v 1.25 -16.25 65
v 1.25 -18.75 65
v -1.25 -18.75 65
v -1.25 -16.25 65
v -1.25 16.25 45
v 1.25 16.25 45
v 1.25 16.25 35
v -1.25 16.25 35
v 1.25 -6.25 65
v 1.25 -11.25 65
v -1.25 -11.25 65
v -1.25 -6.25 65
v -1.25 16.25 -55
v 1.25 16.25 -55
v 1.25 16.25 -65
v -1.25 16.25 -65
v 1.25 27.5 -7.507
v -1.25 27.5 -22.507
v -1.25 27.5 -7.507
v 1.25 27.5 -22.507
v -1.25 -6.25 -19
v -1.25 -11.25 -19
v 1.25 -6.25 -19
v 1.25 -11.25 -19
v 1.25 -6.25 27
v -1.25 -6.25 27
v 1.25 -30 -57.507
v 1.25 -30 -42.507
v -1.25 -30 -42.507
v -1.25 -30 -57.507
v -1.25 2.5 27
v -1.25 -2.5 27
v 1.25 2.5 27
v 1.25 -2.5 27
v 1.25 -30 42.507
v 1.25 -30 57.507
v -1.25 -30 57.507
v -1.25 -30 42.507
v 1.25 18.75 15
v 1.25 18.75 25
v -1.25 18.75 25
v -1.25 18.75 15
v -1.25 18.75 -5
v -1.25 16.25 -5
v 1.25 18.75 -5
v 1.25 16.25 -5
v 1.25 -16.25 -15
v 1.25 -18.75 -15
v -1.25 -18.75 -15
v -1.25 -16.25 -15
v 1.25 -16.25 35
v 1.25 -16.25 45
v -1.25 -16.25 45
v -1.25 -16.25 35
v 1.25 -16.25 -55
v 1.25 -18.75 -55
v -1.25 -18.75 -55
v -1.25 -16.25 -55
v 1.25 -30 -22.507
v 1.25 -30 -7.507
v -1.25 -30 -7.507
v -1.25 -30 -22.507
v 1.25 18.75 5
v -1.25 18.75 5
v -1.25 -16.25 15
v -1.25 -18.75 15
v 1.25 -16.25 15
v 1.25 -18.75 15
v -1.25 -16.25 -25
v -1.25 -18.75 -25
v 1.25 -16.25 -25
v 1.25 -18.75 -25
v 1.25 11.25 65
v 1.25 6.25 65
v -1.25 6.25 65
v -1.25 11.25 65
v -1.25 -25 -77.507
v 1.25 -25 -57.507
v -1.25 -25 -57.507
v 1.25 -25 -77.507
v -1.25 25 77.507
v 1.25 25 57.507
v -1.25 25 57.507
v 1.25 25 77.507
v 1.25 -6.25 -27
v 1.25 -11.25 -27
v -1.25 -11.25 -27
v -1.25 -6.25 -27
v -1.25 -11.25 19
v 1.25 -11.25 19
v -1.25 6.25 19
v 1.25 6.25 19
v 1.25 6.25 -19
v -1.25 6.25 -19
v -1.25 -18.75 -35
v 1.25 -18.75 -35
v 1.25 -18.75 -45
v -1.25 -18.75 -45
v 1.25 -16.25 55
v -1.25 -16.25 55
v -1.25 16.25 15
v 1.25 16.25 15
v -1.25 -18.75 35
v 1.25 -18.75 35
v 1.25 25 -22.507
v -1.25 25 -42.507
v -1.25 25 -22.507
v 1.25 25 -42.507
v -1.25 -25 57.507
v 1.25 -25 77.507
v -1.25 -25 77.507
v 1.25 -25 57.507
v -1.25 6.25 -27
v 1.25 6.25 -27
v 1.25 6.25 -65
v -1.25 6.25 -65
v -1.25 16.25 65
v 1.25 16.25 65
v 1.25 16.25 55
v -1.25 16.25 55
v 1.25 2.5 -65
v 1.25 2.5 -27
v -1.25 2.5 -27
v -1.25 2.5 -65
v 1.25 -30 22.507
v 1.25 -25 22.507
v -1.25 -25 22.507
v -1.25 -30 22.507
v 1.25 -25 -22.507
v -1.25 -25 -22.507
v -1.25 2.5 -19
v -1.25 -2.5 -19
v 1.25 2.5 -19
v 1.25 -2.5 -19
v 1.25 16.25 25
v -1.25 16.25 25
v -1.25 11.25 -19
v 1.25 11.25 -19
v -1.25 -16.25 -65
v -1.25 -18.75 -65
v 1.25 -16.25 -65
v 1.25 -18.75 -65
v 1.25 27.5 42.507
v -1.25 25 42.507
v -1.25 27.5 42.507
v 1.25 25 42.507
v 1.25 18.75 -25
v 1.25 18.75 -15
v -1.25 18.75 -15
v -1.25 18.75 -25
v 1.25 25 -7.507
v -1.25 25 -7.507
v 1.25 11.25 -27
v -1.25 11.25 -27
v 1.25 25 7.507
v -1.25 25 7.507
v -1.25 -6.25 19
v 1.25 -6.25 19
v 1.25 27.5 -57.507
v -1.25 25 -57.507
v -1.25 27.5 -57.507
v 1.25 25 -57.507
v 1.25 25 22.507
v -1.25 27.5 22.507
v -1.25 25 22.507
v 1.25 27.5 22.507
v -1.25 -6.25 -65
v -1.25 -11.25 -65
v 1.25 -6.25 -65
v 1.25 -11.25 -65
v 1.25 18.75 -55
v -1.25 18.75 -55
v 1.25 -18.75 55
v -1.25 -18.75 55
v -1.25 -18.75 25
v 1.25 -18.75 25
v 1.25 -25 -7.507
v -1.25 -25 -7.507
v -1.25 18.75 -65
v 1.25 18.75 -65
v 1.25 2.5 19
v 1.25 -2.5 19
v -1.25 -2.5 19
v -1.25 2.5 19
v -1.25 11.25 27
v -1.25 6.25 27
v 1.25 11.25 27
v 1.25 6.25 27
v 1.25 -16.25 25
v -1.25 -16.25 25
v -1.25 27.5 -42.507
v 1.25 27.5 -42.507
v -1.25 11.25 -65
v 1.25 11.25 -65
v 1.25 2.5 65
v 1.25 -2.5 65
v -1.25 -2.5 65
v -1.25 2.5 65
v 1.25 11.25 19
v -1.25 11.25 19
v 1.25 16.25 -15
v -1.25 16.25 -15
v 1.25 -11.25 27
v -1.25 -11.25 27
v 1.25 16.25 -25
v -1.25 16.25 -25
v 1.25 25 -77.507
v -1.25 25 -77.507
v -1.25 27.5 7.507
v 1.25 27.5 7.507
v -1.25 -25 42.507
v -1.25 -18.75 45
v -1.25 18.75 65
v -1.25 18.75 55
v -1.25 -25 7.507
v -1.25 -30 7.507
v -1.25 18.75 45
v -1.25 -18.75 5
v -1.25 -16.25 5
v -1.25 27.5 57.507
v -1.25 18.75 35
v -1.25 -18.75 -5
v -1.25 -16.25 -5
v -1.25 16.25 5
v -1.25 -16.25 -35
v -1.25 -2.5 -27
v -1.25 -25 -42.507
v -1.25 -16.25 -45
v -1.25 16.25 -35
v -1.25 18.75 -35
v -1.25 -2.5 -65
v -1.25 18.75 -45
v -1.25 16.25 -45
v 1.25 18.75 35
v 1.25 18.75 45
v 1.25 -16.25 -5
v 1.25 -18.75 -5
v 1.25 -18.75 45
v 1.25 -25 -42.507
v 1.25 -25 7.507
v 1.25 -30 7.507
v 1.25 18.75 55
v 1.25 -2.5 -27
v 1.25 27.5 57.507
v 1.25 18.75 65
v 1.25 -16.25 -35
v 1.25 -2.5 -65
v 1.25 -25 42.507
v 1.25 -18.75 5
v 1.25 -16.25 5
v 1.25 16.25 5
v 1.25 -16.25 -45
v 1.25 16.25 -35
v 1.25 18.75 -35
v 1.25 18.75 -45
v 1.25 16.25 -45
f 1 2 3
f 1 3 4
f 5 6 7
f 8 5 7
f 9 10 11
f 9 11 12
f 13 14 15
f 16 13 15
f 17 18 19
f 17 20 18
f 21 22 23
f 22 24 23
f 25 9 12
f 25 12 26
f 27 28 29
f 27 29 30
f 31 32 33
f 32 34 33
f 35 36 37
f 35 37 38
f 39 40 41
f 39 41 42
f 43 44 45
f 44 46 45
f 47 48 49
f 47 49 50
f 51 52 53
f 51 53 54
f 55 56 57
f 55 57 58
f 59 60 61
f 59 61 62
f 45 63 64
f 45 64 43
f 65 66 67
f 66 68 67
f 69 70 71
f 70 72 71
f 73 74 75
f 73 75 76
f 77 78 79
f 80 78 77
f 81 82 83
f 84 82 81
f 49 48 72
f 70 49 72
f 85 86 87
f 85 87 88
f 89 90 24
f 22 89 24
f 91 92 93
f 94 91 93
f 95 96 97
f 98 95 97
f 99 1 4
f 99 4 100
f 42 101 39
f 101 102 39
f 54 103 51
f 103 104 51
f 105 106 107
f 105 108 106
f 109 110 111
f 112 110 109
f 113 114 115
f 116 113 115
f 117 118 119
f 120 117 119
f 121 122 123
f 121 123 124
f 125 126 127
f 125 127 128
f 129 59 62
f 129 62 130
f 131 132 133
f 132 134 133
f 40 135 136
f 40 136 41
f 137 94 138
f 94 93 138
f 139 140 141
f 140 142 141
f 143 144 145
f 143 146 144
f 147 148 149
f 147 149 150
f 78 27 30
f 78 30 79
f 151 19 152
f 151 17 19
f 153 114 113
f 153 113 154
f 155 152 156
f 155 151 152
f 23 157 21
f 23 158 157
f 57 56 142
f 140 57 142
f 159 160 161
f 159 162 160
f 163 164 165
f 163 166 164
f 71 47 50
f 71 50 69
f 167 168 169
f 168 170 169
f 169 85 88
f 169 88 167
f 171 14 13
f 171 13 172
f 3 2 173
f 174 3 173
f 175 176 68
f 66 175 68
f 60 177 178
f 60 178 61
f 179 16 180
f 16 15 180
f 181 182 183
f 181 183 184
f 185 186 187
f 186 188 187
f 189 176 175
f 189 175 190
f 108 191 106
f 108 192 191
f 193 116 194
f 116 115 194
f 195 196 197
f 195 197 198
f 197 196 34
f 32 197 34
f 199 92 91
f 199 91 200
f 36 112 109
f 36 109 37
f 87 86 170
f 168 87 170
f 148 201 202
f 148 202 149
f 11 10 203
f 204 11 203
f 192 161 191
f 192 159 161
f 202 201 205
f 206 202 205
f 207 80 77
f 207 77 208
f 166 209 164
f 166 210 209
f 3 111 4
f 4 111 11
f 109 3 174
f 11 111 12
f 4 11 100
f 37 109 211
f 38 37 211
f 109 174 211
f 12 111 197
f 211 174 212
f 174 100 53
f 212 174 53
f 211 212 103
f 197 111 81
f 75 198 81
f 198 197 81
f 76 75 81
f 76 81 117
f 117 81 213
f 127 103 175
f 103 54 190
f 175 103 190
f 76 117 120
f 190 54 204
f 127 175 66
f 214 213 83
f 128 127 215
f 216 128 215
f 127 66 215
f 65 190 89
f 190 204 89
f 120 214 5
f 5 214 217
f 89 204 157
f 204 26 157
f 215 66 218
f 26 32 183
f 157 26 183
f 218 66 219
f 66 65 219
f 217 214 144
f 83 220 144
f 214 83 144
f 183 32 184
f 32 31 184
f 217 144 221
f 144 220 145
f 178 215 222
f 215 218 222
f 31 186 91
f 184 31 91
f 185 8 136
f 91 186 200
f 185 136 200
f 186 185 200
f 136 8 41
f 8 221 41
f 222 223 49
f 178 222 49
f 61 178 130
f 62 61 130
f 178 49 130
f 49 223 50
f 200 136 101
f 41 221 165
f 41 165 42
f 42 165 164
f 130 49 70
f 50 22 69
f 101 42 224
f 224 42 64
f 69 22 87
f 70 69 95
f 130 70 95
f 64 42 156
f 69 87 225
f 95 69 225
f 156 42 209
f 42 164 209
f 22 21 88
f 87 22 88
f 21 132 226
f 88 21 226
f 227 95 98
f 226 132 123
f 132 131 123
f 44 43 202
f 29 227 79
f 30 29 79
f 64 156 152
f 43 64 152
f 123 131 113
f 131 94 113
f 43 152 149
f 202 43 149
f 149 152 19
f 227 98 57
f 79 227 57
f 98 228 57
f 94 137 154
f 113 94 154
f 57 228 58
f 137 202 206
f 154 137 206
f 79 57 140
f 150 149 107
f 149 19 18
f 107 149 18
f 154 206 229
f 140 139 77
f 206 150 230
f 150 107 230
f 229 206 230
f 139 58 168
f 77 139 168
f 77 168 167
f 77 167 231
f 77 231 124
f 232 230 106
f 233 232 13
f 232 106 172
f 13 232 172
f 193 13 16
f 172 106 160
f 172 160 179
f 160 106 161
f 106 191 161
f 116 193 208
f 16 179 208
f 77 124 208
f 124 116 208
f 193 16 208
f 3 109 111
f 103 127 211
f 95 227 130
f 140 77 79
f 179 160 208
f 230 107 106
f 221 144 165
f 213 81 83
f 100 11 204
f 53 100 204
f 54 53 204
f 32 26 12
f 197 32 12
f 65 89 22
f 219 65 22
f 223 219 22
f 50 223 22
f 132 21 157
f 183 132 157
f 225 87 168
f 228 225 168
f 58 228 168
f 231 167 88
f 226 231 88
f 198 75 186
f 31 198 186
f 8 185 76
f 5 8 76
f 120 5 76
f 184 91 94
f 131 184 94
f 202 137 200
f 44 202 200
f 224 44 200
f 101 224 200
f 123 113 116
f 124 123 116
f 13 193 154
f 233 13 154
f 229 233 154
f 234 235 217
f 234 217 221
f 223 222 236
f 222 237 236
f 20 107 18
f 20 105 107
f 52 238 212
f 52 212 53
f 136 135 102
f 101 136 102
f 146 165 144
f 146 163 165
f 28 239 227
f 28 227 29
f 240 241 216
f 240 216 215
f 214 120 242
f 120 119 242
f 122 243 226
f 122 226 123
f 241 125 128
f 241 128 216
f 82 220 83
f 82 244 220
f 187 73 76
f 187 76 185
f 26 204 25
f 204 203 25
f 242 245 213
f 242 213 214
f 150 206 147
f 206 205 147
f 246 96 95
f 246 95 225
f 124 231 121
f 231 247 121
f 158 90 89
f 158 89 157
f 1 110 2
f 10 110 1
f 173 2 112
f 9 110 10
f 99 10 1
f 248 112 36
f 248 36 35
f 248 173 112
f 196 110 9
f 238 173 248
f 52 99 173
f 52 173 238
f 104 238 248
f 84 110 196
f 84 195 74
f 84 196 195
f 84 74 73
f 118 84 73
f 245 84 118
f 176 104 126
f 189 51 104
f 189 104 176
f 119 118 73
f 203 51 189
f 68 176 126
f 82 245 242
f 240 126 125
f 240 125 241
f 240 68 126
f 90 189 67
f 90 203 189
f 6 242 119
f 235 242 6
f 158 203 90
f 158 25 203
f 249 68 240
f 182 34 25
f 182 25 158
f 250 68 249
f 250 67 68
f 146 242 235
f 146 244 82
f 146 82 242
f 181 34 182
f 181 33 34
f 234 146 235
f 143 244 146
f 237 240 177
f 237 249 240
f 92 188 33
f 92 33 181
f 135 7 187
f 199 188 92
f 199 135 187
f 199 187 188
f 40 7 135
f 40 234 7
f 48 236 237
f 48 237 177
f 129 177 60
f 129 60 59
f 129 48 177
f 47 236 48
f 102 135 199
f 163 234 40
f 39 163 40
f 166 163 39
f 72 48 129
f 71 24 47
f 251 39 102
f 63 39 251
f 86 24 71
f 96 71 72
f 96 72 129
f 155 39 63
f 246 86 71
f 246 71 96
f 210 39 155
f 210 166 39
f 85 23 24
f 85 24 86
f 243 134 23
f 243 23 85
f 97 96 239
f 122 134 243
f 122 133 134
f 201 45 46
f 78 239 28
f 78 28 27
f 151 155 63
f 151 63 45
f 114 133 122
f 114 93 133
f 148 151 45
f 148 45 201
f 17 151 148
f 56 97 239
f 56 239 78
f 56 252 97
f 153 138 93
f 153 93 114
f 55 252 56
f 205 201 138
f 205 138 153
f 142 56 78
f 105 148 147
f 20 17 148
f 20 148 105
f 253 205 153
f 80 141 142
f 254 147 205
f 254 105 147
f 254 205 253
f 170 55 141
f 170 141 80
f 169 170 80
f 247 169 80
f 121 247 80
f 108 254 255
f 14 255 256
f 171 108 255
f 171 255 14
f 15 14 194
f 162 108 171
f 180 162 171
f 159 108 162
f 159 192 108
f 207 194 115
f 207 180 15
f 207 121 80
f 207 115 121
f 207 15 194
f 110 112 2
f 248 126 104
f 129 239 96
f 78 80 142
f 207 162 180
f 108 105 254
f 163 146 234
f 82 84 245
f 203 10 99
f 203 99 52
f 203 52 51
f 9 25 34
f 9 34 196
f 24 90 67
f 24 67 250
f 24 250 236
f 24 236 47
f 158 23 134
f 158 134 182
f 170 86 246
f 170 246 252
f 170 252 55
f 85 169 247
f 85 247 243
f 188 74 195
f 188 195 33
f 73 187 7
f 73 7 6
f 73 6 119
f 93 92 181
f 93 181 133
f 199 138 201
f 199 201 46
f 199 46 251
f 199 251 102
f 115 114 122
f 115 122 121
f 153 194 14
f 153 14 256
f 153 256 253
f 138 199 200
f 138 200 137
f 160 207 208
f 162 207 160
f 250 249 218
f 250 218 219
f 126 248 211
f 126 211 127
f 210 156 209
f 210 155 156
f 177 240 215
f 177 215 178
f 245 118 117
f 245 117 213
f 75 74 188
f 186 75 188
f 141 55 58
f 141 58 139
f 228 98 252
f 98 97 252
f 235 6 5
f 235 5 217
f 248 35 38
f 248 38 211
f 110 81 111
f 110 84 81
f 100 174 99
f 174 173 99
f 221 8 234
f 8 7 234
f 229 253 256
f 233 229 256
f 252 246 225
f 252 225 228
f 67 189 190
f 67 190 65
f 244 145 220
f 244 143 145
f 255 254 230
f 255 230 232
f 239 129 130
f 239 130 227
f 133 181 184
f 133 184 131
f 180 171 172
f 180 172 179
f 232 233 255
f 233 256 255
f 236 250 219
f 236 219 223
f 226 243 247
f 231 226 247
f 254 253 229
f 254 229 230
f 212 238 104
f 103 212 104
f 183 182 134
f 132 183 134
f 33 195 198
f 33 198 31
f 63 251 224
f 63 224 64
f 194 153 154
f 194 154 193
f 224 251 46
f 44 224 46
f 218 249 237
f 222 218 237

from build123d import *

# Parameters (mm, degrees)
SKETCH1_W           = 10
SKETCH1_H           = 2.5
SKETCH1_W_2         = 38
SKETCH1_H_2         = 5
BOSS_EXTRUDE1_DEPTH = 1.25


with BuildPart() as part:
    # Sketch1 → Boss-Extrude1 (new, symmetric)
    with BuildSketch(Plane(origin=(0, 0, 0), x_dir=(0, 0, -1), z_dir=(1, 0, 0))):
        Polygon((-77.50700933, 25), (-77.50700933, -25), (-57.50700933, -25), (-57.50700933, -30), (-42.50700933, -30), (-42.50700933, -25), (-22.50700933, -25), (-22.50700933, -30), (-7.50700933, -30), (-7.50700933, -25), (7.50700933, -25), (7.50700933, -30), (22.50700933, -30), (22.50700933, -25), (42.50700933, -25), (42.50700933, -30), (57.50700933, -30), (57.50700933, -25), (77.50700933, -25), (77.50700933, 25), (57.50700933, 25), (57.50700933, 27.5), (42.50700933, 27.5), (42.50700933, 25), (22.50700933, 25), (22.50700933, 27.5), (7.50700933, 27.5), (7.50700933, 25), (-7.50700933, 25), (-7.50700933, 27.5), (-22.50700933, 27.5), (-22.50700933, 25), (-42.50700933, 25), (-42.50700933, 27.5), (-57.50700933, 27.5), (-57.50700933, 25), align=None)
        with Locations((0, 17.5)):
            Rectangle(SKETCH1_W, SKETCH1_H, mode=Mode.SUBTRACT)
        with Locations((-46, -8.75)):
            Rectangle(SKETCH1_W_2, SKETCH1_H_2, mode=Mode.SUBTRACT)
        with Locations((0, -17.5)):
            Rectangle(SKETCH1_W, SKETCH1_H, mode=Mode.SUBTRACT)
        with Locations((-20, -17.5)):
            Rectangle(SKETCH1_W, SKETCH1_H, mode=Mode.SUBTRACT)
        with Locations((-20, 17.5)):
            Rectangle(SKETCH1_W, SKETCH1_H, mode=Mode.SUBTRACT)
        with Locations((-40, -17.5)):
            Rectangle(SKETCH1_W, SKETCH1_H, mode=Mode.SUBTRACT)
        with Locations((-40, 17.5)):
            Rectangle(SKETCH1_W, SKETCH1_H, mode=Mode.SUBTRACT)
        with Locations((-60, -17.5)):
            Rectangle(SKETCH1_W, SKETCH1_H, mode=Mode.SUBTRACT)
        with Locations((-60, 17.5)):
            Rectangle(SKETCH1_W, SKETCH1_H, mode=Mode.SUBTRACT)
        with Locations((20, -17.5)):
            Rectangle(SKETCH1_W, SKETCH1_H, mode=Mode.SUBTRACT)
        with Locations((20, 17.5)):
            Rectangle(SKETCH1_W, SKETCH1_H, mode=Mode.SUBTRACT)
        with Locations((40, -17.5)):
            Rectangle(SKETCH1_W, SKETCH1_H, mode=Mode.SUBTRACT)
        with Locations((40, 17.5)):
            Rectangle(SKETCH1_W, SKETCH1_H, mode=Mode.SUBTRACT)
        with Locations((60, -17.5)):
            Rectangle(SKETCH1_W, SKETCH1_H, mode=Mode.SUBTRACT)
        with Locations((60, 17.5)):
            Rectangle(SKETCH1_W, SKETCH1_H, mode=Mode.SUBTRACT)
        with Locations((0, 8.75)):
            Rectangle(SKETCH1_W_2, SKETCH1_H_2, mode=Mode.SUBTRACT)
        with Locations((46, 8.75)):
            Rectangle(SKETCH1_W_2, SKETCH1_H_2, mode=Mode.SUBTRACT)
        with Locations((-46, 0)):
            Rectangle(SKETCH1_W_2, SKETCH1_H_2, mode=Mode.SUBTRACT)
        with Locations((-46, 8.75)):
            Rectangle(SKETCH1_W_2, SKETCH1_H_2, mode=Mode.SUBTRACT)
        with Locations((46, -8.75)):
            Rectangle(SKETCH1_W_2, SKETCH1_H_2, mode=Mode.SUBTRACT)
        with Locations((46, 0)):
            Rectangle(SKETCH1_W_2, SKETCH1_H_2, mode=Mode.SUBTRACT)
        Rectangle(SKETCH1_W_2, SKETCH1_H_2, mode=Mode.SUBTRACT)
        with Locations((0, -8.75)):
            Rectangle(SKETCH1_W_2, SKETCH1_H_2, mode=Mode.SUBTRACT)
    extrude(amount=BOSS_EXTRUDE1_DEPTH, both=True)


solid = part.part
